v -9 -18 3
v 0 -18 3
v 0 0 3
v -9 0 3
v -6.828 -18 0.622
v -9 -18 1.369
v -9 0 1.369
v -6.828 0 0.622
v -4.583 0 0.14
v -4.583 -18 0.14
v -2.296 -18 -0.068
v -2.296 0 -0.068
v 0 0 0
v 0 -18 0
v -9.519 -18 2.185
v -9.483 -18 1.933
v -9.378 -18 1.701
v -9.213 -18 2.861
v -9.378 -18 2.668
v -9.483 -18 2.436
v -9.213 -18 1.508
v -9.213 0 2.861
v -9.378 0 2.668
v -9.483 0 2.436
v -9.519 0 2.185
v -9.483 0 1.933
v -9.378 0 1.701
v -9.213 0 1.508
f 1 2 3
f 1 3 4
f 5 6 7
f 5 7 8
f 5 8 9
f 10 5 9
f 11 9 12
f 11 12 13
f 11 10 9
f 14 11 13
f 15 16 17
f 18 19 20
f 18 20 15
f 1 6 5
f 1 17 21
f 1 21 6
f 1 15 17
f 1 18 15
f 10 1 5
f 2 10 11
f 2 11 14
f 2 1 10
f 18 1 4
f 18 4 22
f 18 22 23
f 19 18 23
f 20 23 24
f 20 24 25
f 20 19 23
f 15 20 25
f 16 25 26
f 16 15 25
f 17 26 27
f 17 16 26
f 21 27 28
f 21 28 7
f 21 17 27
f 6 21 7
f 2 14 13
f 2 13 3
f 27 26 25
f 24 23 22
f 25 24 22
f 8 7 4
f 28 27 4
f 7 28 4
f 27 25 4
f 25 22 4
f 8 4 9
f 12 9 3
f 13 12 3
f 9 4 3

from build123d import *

# Parameters (mm, degrees)
F1_DEPTH = 60
F2_DEPTH = 42
F3_DEPTH = 42


with BuildPart() as f1:
    # F0 (on Front) → F1 (new body)
    with BuildSketch(Plane.XZ):
        with BuildLine():
            ThreePointArc((-9, 1.369445934), (-4.5828518842, 0.1402203037), (0, 0))
            Line((0, 0), (0, 3))
            Line((0, 3), (-9, 3))
            ThreePointArc((-9, 3), (-9.5190631598, 2.184722967), (-9, 1.369445934))
        make_face()
    extrude(amount=F1_DEPTH)

    # F2 (add): a face of the model
    f2_faces = [f1.faces().sort_by_distance(p)[0] for p in [
        (-4.2472237482, -60, 1.6364055224),
    ]]
    extrude(f2_faces, amount=-F2_DEPTH)

    # F3 (cut): a face of the model
    f3_faces = [f1.faces().sort_by_distance(p)[0] for p in [
        (-4.2472237482, -60, 1.6364055224),
    ]]
    extrude(f3_faces, amount=-F3_DEPTH, mode=Mode.SUBTRACT)


solid = f1.part
